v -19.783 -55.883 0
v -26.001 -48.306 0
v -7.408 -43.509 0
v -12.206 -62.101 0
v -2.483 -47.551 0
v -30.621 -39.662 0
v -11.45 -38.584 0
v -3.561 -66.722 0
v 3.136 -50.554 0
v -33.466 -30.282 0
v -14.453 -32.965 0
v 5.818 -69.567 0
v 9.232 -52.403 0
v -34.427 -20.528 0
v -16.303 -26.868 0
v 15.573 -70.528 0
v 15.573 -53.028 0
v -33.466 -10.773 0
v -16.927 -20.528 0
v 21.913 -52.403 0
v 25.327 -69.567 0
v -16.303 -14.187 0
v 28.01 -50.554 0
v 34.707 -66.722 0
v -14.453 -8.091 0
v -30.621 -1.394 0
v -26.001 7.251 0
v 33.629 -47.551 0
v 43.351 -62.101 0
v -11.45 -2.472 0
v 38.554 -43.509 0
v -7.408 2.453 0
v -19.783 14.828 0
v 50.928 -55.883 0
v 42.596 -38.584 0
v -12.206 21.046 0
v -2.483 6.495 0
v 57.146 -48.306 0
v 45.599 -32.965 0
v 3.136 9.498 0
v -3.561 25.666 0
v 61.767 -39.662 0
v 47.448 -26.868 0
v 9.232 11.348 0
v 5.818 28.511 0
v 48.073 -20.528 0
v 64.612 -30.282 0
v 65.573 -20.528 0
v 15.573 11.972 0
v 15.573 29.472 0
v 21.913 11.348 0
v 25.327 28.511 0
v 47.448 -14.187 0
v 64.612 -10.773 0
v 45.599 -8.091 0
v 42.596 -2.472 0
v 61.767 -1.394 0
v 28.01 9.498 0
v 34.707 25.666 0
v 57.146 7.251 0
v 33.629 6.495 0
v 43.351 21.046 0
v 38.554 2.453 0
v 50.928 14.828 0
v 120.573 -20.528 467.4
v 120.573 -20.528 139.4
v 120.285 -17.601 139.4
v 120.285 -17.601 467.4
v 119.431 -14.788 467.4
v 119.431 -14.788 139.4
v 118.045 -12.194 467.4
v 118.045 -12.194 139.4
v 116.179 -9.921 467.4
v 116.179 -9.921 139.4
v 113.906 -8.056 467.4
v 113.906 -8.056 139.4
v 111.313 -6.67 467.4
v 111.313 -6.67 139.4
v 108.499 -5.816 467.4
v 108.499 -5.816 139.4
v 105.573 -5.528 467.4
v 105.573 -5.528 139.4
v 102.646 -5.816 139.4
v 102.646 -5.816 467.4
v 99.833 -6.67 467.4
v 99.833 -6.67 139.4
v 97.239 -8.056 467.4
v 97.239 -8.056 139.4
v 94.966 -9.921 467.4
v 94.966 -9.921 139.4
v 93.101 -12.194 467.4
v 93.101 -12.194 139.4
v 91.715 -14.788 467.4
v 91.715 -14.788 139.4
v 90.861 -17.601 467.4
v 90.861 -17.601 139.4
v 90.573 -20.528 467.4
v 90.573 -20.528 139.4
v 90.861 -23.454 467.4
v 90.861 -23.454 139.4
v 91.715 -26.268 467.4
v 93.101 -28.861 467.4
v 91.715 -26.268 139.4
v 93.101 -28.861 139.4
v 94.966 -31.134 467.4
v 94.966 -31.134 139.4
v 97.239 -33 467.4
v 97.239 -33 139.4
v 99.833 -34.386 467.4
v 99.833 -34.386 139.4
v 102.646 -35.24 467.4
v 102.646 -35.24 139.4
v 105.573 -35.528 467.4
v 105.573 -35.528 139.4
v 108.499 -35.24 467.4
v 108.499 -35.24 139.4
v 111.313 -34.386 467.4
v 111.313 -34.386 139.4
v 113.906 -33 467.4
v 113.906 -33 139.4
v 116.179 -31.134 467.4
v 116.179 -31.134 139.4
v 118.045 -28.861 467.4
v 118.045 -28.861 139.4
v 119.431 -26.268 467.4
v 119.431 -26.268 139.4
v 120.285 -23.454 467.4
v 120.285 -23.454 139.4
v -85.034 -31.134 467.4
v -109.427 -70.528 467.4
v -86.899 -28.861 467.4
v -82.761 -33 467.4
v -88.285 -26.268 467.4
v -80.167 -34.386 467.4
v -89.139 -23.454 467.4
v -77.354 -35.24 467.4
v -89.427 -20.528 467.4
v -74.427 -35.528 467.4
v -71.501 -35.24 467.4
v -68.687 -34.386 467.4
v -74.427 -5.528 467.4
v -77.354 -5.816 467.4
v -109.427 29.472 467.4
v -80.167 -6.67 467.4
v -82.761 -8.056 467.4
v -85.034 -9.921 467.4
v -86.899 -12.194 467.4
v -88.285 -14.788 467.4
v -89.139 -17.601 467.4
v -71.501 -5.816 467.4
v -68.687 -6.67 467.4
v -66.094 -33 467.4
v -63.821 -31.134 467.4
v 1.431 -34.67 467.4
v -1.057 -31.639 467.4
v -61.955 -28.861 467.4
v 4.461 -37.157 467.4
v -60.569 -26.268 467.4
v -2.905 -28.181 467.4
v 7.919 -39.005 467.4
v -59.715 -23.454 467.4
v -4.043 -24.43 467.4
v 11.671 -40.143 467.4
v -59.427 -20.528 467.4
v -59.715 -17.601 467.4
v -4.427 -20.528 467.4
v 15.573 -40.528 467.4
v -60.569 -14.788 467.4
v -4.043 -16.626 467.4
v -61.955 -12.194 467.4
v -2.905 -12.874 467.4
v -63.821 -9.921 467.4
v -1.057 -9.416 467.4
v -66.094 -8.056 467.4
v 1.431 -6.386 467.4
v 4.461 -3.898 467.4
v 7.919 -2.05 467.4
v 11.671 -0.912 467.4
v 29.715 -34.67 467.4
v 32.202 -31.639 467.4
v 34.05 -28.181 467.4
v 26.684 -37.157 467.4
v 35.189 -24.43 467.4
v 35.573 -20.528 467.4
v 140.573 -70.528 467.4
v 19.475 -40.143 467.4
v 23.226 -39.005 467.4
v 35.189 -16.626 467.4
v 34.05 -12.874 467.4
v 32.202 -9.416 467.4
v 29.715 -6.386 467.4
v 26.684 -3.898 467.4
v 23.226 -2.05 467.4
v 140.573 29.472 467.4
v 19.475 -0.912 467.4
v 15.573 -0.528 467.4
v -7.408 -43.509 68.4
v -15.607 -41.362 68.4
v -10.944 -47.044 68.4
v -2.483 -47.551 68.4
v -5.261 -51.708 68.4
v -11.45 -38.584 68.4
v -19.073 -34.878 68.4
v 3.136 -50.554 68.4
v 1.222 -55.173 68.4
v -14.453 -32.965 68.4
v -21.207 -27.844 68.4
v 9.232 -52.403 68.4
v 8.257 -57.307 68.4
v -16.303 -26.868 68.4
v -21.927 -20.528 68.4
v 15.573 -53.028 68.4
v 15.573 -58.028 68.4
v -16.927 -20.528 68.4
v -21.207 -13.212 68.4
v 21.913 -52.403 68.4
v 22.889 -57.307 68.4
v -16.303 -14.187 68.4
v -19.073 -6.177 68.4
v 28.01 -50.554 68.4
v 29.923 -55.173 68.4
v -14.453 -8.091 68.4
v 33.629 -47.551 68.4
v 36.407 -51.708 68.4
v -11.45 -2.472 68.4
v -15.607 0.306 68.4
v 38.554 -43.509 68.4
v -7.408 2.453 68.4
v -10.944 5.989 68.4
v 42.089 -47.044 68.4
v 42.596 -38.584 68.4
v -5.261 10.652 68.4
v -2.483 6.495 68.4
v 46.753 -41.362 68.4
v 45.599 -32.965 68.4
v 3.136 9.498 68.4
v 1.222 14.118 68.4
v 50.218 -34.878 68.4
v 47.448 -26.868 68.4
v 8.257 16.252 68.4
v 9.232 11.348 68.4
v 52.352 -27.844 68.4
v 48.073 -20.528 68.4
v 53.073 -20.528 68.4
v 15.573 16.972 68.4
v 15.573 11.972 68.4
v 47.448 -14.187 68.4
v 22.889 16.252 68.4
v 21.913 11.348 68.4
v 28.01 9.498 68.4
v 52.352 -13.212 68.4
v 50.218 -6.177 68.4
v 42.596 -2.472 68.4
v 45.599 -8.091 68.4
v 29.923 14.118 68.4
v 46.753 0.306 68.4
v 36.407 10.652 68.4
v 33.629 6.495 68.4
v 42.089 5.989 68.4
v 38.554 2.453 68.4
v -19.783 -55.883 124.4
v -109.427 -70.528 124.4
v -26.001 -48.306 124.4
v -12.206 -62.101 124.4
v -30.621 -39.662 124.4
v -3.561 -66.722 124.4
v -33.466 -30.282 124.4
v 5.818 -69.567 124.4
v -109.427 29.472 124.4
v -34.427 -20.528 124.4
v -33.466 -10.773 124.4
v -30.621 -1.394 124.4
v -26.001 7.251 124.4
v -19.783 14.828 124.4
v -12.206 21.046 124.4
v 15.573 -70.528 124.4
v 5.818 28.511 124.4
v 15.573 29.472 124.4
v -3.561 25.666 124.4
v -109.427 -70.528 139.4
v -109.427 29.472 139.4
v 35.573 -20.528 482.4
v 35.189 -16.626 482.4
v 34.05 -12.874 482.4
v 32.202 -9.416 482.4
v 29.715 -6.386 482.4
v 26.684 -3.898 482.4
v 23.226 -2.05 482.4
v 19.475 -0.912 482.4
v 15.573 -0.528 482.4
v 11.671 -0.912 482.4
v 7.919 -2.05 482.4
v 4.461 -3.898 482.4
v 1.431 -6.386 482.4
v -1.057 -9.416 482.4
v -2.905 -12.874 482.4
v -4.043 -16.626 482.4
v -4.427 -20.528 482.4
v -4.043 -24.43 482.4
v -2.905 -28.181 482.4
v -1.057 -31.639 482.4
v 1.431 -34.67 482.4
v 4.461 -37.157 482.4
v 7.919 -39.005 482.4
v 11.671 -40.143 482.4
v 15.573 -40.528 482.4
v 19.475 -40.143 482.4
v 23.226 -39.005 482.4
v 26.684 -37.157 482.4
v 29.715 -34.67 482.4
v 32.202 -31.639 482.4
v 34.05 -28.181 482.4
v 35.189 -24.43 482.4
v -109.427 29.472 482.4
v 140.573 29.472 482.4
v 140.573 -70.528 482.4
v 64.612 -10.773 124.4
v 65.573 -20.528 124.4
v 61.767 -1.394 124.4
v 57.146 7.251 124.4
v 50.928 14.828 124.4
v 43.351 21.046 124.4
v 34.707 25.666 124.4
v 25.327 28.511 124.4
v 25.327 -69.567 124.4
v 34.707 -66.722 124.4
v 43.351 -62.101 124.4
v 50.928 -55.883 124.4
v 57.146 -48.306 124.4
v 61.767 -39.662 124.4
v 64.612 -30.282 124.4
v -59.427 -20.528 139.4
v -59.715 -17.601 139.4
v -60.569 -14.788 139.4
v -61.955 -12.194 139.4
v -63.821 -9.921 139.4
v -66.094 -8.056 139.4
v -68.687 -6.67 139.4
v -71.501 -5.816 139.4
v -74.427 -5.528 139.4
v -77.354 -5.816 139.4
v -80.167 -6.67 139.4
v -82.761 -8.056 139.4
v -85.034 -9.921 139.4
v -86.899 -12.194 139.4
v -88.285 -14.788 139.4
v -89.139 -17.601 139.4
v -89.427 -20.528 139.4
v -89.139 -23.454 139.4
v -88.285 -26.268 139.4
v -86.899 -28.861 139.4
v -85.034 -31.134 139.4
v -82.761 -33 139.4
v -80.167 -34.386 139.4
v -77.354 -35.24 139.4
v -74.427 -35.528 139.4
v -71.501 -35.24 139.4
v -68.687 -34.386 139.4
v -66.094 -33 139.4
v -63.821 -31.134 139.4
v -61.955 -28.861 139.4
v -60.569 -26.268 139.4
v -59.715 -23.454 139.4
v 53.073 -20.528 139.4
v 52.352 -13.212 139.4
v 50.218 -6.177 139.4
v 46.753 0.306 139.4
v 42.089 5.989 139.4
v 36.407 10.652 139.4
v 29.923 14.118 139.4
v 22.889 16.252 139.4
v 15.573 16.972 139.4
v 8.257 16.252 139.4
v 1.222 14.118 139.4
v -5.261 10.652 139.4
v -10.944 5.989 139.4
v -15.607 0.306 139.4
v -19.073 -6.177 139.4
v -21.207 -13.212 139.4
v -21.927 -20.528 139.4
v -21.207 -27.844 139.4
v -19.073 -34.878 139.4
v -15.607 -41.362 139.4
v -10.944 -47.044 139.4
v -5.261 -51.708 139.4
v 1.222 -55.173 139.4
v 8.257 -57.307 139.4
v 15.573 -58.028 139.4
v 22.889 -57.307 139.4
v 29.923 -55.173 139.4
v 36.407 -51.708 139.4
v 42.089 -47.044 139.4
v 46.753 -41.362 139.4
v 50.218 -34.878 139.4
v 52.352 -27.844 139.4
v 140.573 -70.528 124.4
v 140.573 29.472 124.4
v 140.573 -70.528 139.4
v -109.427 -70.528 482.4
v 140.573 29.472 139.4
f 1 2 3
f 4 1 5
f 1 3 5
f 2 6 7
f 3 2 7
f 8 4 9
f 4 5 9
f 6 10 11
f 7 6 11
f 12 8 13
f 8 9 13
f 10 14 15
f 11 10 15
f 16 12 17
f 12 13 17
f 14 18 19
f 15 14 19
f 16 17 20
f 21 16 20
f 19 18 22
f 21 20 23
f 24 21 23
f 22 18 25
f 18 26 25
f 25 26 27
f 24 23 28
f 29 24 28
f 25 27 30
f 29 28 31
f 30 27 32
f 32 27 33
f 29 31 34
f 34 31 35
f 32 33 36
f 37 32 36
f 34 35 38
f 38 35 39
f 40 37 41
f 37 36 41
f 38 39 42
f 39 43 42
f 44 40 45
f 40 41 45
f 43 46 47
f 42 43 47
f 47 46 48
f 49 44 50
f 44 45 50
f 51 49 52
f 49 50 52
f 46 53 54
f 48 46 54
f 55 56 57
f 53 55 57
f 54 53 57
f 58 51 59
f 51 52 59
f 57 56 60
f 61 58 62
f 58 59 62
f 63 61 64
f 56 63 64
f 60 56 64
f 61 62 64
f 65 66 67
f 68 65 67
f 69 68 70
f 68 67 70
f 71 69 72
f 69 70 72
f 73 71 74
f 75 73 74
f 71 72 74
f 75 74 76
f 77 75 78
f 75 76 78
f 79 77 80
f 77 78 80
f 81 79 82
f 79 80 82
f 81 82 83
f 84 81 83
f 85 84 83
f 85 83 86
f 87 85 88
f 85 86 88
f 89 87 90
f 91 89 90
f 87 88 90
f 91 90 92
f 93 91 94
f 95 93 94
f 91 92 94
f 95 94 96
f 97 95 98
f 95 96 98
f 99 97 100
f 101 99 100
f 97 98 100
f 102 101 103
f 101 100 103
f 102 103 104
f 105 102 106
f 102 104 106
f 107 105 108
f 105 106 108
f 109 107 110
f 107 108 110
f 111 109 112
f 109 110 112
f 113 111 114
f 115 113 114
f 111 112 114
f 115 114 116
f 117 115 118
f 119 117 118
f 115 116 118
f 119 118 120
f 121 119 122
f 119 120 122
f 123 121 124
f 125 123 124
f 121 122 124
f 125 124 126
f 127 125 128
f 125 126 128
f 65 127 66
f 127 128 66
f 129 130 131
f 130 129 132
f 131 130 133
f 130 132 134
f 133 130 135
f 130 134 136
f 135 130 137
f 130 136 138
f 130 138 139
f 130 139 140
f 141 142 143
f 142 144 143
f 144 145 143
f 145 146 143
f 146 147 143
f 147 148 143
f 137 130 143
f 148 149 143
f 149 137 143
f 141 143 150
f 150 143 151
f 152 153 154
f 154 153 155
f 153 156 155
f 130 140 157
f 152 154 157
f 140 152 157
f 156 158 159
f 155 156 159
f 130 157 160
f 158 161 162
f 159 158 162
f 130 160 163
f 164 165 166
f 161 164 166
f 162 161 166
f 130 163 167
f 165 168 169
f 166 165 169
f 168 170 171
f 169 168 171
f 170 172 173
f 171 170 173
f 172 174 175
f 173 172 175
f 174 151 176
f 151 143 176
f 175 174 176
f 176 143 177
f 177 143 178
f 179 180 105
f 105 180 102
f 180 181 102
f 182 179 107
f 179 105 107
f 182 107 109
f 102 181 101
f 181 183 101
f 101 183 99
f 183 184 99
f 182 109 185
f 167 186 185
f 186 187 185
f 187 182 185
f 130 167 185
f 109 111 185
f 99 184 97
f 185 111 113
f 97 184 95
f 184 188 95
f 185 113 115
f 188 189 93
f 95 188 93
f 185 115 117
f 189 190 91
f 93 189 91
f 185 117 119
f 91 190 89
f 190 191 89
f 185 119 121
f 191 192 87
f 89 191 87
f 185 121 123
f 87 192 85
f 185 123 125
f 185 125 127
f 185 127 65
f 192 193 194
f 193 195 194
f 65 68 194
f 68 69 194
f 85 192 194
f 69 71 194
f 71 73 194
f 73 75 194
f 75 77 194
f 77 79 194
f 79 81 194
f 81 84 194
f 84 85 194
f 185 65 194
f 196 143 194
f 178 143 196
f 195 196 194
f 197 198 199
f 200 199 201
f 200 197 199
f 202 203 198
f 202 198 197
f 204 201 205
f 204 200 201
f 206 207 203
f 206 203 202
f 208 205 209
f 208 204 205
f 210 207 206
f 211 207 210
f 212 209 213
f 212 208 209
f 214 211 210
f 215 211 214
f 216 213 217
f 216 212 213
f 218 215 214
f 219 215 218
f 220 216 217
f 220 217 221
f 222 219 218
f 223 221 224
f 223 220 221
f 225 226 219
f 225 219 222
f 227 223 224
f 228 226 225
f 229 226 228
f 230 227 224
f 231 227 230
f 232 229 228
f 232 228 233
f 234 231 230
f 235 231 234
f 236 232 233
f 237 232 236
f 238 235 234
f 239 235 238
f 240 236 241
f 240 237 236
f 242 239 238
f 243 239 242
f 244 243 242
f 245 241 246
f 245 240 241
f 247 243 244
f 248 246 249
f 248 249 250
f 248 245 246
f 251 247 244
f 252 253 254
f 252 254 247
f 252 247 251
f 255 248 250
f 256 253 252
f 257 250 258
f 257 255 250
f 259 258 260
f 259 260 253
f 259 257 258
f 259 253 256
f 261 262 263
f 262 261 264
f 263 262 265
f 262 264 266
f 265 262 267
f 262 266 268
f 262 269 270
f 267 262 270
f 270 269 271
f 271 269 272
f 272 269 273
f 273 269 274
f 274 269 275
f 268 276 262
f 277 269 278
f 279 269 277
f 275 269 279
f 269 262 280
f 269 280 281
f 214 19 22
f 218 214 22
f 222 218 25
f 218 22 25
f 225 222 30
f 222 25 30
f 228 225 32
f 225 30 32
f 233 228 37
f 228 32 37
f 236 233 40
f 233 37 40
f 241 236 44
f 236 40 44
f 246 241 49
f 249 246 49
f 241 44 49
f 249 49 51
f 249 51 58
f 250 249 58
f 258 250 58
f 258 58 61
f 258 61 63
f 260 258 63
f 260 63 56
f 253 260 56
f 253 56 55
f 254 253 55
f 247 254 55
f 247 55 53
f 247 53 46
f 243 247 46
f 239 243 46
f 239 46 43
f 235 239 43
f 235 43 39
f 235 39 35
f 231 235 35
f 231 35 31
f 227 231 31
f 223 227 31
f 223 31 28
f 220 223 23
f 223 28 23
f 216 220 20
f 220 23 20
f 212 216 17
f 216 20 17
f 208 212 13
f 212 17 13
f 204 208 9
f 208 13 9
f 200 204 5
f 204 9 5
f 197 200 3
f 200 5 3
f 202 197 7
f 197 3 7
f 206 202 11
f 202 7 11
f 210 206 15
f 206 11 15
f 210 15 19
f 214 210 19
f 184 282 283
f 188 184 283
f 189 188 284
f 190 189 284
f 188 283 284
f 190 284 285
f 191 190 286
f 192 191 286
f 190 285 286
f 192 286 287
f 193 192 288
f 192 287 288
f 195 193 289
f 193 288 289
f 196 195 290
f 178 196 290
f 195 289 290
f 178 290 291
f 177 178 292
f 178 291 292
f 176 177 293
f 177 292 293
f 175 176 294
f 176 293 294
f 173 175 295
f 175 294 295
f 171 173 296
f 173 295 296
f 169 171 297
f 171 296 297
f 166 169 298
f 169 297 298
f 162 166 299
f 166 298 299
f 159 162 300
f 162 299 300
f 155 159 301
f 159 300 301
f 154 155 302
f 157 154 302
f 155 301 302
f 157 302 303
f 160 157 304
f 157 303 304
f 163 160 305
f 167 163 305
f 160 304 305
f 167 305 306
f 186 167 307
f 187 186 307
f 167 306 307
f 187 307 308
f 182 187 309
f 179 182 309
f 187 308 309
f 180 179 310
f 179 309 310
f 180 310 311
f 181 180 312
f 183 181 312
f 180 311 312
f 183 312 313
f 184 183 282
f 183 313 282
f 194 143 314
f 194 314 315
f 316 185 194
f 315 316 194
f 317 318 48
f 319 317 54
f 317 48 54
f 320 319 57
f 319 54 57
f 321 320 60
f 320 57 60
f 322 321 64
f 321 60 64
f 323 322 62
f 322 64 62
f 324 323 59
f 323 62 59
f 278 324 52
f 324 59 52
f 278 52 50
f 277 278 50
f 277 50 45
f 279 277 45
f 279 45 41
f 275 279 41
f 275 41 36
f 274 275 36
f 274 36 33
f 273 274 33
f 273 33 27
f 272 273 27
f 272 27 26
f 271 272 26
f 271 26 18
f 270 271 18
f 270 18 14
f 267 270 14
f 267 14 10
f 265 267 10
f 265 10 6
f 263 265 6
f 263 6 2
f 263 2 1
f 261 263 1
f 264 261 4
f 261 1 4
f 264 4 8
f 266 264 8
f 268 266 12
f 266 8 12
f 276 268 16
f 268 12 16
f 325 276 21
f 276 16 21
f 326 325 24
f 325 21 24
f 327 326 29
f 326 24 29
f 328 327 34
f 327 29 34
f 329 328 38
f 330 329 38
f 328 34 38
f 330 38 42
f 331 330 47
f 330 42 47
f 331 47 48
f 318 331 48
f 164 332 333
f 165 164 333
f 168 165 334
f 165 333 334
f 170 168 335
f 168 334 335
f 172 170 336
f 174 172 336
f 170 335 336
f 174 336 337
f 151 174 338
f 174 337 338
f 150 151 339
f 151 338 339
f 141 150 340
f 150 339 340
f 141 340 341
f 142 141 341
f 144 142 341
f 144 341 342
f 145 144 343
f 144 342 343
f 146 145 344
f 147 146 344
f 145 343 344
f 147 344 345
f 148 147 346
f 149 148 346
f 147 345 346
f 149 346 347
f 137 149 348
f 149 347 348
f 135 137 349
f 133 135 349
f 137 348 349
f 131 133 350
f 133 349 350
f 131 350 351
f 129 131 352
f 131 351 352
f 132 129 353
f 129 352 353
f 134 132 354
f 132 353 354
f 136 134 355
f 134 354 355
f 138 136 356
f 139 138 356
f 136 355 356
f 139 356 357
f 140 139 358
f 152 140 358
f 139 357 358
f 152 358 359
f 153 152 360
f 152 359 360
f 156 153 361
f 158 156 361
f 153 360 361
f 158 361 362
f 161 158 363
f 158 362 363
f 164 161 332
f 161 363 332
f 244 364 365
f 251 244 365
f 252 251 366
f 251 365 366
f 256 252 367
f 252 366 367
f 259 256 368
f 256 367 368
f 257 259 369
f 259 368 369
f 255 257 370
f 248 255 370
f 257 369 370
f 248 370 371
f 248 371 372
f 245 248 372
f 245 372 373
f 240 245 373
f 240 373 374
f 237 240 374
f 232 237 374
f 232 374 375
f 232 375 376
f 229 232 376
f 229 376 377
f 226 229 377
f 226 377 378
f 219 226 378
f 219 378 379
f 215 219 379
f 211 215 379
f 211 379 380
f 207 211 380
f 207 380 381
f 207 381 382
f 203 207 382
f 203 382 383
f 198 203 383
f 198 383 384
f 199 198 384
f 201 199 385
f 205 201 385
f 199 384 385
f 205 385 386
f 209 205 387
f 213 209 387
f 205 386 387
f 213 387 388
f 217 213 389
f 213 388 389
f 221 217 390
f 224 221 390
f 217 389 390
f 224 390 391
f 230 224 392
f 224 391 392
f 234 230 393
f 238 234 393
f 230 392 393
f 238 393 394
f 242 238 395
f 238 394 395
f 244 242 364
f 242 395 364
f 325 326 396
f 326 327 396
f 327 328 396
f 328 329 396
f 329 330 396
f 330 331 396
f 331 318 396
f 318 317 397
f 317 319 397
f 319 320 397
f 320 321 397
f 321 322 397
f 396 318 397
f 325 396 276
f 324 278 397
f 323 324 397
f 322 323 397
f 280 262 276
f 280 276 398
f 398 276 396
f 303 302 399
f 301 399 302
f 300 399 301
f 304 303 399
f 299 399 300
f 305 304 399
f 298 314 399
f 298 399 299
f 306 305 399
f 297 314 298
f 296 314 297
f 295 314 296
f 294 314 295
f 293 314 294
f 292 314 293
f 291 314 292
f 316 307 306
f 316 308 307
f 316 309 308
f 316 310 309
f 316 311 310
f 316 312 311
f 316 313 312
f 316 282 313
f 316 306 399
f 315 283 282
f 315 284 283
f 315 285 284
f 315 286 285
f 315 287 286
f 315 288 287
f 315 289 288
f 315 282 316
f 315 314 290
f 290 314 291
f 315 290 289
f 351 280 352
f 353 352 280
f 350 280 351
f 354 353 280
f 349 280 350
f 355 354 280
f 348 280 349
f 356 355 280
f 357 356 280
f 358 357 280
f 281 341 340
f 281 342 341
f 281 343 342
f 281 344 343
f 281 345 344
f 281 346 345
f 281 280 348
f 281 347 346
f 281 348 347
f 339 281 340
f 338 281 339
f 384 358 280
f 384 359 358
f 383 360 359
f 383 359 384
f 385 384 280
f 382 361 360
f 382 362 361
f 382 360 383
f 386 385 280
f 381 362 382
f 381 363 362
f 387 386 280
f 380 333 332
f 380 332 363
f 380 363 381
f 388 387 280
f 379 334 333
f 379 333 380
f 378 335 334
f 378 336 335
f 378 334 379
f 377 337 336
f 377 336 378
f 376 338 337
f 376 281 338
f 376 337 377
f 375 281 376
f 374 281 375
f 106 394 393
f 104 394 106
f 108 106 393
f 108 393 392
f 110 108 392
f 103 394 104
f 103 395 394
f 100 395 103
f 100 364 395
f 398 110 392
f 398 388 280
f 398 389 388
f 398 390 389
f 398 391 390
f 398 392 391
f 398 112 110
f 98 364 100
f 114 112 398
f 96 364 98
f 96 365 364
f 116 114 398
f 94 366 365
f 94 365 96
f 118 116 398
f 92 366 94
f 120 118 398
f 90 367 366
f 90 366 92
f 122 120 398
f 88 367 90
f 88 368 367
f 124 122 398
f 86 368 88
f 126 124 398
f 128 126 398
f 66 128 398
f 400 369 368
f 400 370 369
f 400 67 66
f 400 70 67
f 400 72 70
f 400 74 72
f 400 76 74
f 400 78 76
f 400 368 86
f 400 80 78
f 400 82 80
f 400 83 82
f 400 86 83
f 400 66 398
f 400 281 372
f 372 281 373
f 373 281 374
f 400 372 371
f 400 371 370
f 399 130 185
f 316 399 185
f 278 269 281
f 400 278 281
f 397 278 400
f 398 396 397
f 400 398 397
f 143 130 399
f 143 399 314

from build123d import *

# Parameters (mm, degrees)
SKETCH7_R           = 50
BOSS_EXTRUDE3_DEPTH = 124.4
SKETCH8_R           = 37.5
CUT_EXTRUDE3_DEPTH  = 56
SKETCH9_R           = 32.5
CUT_EXTRUDE4_DEPTH  = 69.4
SKETCH10_W          = 250
SKETCH10_H          = 100
BOSS_EXTRUDE4_DEPTH = 15
SKETCH11_R          = 37.5
CUT_EXTRUDE5_DEPTH  = 15
SKETCH12_R          = 15
BOSS_EXTRUDE5_DEPTH = 328
LPATTERN1_COUNT     = 2
LPATTERN1_PITCH     = 180
SKETCH13_W          = 250
SKETCH13_H          = 100
BOSS_EXTRUDE6_DEPTH = 15
SKETCH15_R          = 20
CUT_EXTRUDE6_DEPTH  = 15


with BuildPart() as part:
    # Sketch7 → Boss-Extrude3 (new body)
    with BuildSketch(Plane.XY):
        with Locations((15.572802758, -20.527785454)):
            Circle(SKETCH7_R)
    extrude(amount=BOSS_EXTRUDE3_DEPTH)

    # Sketch8 → Cut-Extrude3 (cut)
    with BuildSketch(Plane.XY.offset(124.4)):
        with Locations((15.572802758, -20.527785454)):
            Circle(SKETCH8_R)
    extrude(amount=-CUT_EXTRUDE3_DEPTH, mode=Mode.SUBTRACT)

    # Sketch9 → Cut-Extrude4 (cut)
    with BuildSketch(Plane(origin=(0, 0, 0), x_dir=(-1, 0, 0), z_dir=(0, 0, -1))):
        with Locations((-15.572802758, -20.527785454)):
            Circle(SKETCH9_R)
    extrude(amount=-CUT_EXTRUDE4_DEPTH, mode=Mode.SUBTRACT)

    # Sketch10 → Boss-Extrude4 (add)
    with BuildSketch(Plane.XY.offset(124.4)):
        with Locations((15.572802758, -20.527785454)):
            Rectangle(SKETCH10_W, SKETCH10_H)
    extrude(amount=BOSS_EXTRUDE4_DEPTH)

    # Sketch11 → Cut-Extrude5 (cut)
    with BuildSketch(Plane.XY.offset(139.4)):
        with Locations((15.572802758, -20.527785454)):
            Circle(SKETCH11_R)
    extrude(amount=-CUT_EXTRUDE5_DEPTH, mode=Mode.SUBTRACT)

    # Sketch12 → Boss-Extrude5 (add)
    with BuildSketch(Plane.XY.offset(139.4)):
        with Locations((105.572802758, -20.527785454)):
            Circle(SKETCH12_R)
    boss_extrude5 = extrude(amount=BOSS_EXTRUDE5_DEPTH)

    # LPattern1: Boss-Extrude5 ×2
    with Locations(*[(-i * LPATTERN1_PITCH, 0, 0) for i in range(1, LPATTERN1_COUNT)]):
        add(boss_extrude5)

    # Sketch13 → Boss-Extrude6 (add)
    with BuildSketch(Plane.XY.offset(467.4)):
        with Locations((15.572802758, -20.527785454)):
            Rectangle(SKETCH13_W, SKETCH13_H)
    extrude(amount=BOSS_EXTRUDE6_DEPTH)

    # Sketch15 → Cut-Extrude6 (cut)
    with BuildSketch(Plane.XY.offset(482.4)):
        with Locations((15.572802758, -20.527785454)):
            Circle(SKETCH15_R)
    extrude(amount=-CUT_EXTRUDE6_DEPTH, mode=Mode.SUBTRACT)


solid = part.part
